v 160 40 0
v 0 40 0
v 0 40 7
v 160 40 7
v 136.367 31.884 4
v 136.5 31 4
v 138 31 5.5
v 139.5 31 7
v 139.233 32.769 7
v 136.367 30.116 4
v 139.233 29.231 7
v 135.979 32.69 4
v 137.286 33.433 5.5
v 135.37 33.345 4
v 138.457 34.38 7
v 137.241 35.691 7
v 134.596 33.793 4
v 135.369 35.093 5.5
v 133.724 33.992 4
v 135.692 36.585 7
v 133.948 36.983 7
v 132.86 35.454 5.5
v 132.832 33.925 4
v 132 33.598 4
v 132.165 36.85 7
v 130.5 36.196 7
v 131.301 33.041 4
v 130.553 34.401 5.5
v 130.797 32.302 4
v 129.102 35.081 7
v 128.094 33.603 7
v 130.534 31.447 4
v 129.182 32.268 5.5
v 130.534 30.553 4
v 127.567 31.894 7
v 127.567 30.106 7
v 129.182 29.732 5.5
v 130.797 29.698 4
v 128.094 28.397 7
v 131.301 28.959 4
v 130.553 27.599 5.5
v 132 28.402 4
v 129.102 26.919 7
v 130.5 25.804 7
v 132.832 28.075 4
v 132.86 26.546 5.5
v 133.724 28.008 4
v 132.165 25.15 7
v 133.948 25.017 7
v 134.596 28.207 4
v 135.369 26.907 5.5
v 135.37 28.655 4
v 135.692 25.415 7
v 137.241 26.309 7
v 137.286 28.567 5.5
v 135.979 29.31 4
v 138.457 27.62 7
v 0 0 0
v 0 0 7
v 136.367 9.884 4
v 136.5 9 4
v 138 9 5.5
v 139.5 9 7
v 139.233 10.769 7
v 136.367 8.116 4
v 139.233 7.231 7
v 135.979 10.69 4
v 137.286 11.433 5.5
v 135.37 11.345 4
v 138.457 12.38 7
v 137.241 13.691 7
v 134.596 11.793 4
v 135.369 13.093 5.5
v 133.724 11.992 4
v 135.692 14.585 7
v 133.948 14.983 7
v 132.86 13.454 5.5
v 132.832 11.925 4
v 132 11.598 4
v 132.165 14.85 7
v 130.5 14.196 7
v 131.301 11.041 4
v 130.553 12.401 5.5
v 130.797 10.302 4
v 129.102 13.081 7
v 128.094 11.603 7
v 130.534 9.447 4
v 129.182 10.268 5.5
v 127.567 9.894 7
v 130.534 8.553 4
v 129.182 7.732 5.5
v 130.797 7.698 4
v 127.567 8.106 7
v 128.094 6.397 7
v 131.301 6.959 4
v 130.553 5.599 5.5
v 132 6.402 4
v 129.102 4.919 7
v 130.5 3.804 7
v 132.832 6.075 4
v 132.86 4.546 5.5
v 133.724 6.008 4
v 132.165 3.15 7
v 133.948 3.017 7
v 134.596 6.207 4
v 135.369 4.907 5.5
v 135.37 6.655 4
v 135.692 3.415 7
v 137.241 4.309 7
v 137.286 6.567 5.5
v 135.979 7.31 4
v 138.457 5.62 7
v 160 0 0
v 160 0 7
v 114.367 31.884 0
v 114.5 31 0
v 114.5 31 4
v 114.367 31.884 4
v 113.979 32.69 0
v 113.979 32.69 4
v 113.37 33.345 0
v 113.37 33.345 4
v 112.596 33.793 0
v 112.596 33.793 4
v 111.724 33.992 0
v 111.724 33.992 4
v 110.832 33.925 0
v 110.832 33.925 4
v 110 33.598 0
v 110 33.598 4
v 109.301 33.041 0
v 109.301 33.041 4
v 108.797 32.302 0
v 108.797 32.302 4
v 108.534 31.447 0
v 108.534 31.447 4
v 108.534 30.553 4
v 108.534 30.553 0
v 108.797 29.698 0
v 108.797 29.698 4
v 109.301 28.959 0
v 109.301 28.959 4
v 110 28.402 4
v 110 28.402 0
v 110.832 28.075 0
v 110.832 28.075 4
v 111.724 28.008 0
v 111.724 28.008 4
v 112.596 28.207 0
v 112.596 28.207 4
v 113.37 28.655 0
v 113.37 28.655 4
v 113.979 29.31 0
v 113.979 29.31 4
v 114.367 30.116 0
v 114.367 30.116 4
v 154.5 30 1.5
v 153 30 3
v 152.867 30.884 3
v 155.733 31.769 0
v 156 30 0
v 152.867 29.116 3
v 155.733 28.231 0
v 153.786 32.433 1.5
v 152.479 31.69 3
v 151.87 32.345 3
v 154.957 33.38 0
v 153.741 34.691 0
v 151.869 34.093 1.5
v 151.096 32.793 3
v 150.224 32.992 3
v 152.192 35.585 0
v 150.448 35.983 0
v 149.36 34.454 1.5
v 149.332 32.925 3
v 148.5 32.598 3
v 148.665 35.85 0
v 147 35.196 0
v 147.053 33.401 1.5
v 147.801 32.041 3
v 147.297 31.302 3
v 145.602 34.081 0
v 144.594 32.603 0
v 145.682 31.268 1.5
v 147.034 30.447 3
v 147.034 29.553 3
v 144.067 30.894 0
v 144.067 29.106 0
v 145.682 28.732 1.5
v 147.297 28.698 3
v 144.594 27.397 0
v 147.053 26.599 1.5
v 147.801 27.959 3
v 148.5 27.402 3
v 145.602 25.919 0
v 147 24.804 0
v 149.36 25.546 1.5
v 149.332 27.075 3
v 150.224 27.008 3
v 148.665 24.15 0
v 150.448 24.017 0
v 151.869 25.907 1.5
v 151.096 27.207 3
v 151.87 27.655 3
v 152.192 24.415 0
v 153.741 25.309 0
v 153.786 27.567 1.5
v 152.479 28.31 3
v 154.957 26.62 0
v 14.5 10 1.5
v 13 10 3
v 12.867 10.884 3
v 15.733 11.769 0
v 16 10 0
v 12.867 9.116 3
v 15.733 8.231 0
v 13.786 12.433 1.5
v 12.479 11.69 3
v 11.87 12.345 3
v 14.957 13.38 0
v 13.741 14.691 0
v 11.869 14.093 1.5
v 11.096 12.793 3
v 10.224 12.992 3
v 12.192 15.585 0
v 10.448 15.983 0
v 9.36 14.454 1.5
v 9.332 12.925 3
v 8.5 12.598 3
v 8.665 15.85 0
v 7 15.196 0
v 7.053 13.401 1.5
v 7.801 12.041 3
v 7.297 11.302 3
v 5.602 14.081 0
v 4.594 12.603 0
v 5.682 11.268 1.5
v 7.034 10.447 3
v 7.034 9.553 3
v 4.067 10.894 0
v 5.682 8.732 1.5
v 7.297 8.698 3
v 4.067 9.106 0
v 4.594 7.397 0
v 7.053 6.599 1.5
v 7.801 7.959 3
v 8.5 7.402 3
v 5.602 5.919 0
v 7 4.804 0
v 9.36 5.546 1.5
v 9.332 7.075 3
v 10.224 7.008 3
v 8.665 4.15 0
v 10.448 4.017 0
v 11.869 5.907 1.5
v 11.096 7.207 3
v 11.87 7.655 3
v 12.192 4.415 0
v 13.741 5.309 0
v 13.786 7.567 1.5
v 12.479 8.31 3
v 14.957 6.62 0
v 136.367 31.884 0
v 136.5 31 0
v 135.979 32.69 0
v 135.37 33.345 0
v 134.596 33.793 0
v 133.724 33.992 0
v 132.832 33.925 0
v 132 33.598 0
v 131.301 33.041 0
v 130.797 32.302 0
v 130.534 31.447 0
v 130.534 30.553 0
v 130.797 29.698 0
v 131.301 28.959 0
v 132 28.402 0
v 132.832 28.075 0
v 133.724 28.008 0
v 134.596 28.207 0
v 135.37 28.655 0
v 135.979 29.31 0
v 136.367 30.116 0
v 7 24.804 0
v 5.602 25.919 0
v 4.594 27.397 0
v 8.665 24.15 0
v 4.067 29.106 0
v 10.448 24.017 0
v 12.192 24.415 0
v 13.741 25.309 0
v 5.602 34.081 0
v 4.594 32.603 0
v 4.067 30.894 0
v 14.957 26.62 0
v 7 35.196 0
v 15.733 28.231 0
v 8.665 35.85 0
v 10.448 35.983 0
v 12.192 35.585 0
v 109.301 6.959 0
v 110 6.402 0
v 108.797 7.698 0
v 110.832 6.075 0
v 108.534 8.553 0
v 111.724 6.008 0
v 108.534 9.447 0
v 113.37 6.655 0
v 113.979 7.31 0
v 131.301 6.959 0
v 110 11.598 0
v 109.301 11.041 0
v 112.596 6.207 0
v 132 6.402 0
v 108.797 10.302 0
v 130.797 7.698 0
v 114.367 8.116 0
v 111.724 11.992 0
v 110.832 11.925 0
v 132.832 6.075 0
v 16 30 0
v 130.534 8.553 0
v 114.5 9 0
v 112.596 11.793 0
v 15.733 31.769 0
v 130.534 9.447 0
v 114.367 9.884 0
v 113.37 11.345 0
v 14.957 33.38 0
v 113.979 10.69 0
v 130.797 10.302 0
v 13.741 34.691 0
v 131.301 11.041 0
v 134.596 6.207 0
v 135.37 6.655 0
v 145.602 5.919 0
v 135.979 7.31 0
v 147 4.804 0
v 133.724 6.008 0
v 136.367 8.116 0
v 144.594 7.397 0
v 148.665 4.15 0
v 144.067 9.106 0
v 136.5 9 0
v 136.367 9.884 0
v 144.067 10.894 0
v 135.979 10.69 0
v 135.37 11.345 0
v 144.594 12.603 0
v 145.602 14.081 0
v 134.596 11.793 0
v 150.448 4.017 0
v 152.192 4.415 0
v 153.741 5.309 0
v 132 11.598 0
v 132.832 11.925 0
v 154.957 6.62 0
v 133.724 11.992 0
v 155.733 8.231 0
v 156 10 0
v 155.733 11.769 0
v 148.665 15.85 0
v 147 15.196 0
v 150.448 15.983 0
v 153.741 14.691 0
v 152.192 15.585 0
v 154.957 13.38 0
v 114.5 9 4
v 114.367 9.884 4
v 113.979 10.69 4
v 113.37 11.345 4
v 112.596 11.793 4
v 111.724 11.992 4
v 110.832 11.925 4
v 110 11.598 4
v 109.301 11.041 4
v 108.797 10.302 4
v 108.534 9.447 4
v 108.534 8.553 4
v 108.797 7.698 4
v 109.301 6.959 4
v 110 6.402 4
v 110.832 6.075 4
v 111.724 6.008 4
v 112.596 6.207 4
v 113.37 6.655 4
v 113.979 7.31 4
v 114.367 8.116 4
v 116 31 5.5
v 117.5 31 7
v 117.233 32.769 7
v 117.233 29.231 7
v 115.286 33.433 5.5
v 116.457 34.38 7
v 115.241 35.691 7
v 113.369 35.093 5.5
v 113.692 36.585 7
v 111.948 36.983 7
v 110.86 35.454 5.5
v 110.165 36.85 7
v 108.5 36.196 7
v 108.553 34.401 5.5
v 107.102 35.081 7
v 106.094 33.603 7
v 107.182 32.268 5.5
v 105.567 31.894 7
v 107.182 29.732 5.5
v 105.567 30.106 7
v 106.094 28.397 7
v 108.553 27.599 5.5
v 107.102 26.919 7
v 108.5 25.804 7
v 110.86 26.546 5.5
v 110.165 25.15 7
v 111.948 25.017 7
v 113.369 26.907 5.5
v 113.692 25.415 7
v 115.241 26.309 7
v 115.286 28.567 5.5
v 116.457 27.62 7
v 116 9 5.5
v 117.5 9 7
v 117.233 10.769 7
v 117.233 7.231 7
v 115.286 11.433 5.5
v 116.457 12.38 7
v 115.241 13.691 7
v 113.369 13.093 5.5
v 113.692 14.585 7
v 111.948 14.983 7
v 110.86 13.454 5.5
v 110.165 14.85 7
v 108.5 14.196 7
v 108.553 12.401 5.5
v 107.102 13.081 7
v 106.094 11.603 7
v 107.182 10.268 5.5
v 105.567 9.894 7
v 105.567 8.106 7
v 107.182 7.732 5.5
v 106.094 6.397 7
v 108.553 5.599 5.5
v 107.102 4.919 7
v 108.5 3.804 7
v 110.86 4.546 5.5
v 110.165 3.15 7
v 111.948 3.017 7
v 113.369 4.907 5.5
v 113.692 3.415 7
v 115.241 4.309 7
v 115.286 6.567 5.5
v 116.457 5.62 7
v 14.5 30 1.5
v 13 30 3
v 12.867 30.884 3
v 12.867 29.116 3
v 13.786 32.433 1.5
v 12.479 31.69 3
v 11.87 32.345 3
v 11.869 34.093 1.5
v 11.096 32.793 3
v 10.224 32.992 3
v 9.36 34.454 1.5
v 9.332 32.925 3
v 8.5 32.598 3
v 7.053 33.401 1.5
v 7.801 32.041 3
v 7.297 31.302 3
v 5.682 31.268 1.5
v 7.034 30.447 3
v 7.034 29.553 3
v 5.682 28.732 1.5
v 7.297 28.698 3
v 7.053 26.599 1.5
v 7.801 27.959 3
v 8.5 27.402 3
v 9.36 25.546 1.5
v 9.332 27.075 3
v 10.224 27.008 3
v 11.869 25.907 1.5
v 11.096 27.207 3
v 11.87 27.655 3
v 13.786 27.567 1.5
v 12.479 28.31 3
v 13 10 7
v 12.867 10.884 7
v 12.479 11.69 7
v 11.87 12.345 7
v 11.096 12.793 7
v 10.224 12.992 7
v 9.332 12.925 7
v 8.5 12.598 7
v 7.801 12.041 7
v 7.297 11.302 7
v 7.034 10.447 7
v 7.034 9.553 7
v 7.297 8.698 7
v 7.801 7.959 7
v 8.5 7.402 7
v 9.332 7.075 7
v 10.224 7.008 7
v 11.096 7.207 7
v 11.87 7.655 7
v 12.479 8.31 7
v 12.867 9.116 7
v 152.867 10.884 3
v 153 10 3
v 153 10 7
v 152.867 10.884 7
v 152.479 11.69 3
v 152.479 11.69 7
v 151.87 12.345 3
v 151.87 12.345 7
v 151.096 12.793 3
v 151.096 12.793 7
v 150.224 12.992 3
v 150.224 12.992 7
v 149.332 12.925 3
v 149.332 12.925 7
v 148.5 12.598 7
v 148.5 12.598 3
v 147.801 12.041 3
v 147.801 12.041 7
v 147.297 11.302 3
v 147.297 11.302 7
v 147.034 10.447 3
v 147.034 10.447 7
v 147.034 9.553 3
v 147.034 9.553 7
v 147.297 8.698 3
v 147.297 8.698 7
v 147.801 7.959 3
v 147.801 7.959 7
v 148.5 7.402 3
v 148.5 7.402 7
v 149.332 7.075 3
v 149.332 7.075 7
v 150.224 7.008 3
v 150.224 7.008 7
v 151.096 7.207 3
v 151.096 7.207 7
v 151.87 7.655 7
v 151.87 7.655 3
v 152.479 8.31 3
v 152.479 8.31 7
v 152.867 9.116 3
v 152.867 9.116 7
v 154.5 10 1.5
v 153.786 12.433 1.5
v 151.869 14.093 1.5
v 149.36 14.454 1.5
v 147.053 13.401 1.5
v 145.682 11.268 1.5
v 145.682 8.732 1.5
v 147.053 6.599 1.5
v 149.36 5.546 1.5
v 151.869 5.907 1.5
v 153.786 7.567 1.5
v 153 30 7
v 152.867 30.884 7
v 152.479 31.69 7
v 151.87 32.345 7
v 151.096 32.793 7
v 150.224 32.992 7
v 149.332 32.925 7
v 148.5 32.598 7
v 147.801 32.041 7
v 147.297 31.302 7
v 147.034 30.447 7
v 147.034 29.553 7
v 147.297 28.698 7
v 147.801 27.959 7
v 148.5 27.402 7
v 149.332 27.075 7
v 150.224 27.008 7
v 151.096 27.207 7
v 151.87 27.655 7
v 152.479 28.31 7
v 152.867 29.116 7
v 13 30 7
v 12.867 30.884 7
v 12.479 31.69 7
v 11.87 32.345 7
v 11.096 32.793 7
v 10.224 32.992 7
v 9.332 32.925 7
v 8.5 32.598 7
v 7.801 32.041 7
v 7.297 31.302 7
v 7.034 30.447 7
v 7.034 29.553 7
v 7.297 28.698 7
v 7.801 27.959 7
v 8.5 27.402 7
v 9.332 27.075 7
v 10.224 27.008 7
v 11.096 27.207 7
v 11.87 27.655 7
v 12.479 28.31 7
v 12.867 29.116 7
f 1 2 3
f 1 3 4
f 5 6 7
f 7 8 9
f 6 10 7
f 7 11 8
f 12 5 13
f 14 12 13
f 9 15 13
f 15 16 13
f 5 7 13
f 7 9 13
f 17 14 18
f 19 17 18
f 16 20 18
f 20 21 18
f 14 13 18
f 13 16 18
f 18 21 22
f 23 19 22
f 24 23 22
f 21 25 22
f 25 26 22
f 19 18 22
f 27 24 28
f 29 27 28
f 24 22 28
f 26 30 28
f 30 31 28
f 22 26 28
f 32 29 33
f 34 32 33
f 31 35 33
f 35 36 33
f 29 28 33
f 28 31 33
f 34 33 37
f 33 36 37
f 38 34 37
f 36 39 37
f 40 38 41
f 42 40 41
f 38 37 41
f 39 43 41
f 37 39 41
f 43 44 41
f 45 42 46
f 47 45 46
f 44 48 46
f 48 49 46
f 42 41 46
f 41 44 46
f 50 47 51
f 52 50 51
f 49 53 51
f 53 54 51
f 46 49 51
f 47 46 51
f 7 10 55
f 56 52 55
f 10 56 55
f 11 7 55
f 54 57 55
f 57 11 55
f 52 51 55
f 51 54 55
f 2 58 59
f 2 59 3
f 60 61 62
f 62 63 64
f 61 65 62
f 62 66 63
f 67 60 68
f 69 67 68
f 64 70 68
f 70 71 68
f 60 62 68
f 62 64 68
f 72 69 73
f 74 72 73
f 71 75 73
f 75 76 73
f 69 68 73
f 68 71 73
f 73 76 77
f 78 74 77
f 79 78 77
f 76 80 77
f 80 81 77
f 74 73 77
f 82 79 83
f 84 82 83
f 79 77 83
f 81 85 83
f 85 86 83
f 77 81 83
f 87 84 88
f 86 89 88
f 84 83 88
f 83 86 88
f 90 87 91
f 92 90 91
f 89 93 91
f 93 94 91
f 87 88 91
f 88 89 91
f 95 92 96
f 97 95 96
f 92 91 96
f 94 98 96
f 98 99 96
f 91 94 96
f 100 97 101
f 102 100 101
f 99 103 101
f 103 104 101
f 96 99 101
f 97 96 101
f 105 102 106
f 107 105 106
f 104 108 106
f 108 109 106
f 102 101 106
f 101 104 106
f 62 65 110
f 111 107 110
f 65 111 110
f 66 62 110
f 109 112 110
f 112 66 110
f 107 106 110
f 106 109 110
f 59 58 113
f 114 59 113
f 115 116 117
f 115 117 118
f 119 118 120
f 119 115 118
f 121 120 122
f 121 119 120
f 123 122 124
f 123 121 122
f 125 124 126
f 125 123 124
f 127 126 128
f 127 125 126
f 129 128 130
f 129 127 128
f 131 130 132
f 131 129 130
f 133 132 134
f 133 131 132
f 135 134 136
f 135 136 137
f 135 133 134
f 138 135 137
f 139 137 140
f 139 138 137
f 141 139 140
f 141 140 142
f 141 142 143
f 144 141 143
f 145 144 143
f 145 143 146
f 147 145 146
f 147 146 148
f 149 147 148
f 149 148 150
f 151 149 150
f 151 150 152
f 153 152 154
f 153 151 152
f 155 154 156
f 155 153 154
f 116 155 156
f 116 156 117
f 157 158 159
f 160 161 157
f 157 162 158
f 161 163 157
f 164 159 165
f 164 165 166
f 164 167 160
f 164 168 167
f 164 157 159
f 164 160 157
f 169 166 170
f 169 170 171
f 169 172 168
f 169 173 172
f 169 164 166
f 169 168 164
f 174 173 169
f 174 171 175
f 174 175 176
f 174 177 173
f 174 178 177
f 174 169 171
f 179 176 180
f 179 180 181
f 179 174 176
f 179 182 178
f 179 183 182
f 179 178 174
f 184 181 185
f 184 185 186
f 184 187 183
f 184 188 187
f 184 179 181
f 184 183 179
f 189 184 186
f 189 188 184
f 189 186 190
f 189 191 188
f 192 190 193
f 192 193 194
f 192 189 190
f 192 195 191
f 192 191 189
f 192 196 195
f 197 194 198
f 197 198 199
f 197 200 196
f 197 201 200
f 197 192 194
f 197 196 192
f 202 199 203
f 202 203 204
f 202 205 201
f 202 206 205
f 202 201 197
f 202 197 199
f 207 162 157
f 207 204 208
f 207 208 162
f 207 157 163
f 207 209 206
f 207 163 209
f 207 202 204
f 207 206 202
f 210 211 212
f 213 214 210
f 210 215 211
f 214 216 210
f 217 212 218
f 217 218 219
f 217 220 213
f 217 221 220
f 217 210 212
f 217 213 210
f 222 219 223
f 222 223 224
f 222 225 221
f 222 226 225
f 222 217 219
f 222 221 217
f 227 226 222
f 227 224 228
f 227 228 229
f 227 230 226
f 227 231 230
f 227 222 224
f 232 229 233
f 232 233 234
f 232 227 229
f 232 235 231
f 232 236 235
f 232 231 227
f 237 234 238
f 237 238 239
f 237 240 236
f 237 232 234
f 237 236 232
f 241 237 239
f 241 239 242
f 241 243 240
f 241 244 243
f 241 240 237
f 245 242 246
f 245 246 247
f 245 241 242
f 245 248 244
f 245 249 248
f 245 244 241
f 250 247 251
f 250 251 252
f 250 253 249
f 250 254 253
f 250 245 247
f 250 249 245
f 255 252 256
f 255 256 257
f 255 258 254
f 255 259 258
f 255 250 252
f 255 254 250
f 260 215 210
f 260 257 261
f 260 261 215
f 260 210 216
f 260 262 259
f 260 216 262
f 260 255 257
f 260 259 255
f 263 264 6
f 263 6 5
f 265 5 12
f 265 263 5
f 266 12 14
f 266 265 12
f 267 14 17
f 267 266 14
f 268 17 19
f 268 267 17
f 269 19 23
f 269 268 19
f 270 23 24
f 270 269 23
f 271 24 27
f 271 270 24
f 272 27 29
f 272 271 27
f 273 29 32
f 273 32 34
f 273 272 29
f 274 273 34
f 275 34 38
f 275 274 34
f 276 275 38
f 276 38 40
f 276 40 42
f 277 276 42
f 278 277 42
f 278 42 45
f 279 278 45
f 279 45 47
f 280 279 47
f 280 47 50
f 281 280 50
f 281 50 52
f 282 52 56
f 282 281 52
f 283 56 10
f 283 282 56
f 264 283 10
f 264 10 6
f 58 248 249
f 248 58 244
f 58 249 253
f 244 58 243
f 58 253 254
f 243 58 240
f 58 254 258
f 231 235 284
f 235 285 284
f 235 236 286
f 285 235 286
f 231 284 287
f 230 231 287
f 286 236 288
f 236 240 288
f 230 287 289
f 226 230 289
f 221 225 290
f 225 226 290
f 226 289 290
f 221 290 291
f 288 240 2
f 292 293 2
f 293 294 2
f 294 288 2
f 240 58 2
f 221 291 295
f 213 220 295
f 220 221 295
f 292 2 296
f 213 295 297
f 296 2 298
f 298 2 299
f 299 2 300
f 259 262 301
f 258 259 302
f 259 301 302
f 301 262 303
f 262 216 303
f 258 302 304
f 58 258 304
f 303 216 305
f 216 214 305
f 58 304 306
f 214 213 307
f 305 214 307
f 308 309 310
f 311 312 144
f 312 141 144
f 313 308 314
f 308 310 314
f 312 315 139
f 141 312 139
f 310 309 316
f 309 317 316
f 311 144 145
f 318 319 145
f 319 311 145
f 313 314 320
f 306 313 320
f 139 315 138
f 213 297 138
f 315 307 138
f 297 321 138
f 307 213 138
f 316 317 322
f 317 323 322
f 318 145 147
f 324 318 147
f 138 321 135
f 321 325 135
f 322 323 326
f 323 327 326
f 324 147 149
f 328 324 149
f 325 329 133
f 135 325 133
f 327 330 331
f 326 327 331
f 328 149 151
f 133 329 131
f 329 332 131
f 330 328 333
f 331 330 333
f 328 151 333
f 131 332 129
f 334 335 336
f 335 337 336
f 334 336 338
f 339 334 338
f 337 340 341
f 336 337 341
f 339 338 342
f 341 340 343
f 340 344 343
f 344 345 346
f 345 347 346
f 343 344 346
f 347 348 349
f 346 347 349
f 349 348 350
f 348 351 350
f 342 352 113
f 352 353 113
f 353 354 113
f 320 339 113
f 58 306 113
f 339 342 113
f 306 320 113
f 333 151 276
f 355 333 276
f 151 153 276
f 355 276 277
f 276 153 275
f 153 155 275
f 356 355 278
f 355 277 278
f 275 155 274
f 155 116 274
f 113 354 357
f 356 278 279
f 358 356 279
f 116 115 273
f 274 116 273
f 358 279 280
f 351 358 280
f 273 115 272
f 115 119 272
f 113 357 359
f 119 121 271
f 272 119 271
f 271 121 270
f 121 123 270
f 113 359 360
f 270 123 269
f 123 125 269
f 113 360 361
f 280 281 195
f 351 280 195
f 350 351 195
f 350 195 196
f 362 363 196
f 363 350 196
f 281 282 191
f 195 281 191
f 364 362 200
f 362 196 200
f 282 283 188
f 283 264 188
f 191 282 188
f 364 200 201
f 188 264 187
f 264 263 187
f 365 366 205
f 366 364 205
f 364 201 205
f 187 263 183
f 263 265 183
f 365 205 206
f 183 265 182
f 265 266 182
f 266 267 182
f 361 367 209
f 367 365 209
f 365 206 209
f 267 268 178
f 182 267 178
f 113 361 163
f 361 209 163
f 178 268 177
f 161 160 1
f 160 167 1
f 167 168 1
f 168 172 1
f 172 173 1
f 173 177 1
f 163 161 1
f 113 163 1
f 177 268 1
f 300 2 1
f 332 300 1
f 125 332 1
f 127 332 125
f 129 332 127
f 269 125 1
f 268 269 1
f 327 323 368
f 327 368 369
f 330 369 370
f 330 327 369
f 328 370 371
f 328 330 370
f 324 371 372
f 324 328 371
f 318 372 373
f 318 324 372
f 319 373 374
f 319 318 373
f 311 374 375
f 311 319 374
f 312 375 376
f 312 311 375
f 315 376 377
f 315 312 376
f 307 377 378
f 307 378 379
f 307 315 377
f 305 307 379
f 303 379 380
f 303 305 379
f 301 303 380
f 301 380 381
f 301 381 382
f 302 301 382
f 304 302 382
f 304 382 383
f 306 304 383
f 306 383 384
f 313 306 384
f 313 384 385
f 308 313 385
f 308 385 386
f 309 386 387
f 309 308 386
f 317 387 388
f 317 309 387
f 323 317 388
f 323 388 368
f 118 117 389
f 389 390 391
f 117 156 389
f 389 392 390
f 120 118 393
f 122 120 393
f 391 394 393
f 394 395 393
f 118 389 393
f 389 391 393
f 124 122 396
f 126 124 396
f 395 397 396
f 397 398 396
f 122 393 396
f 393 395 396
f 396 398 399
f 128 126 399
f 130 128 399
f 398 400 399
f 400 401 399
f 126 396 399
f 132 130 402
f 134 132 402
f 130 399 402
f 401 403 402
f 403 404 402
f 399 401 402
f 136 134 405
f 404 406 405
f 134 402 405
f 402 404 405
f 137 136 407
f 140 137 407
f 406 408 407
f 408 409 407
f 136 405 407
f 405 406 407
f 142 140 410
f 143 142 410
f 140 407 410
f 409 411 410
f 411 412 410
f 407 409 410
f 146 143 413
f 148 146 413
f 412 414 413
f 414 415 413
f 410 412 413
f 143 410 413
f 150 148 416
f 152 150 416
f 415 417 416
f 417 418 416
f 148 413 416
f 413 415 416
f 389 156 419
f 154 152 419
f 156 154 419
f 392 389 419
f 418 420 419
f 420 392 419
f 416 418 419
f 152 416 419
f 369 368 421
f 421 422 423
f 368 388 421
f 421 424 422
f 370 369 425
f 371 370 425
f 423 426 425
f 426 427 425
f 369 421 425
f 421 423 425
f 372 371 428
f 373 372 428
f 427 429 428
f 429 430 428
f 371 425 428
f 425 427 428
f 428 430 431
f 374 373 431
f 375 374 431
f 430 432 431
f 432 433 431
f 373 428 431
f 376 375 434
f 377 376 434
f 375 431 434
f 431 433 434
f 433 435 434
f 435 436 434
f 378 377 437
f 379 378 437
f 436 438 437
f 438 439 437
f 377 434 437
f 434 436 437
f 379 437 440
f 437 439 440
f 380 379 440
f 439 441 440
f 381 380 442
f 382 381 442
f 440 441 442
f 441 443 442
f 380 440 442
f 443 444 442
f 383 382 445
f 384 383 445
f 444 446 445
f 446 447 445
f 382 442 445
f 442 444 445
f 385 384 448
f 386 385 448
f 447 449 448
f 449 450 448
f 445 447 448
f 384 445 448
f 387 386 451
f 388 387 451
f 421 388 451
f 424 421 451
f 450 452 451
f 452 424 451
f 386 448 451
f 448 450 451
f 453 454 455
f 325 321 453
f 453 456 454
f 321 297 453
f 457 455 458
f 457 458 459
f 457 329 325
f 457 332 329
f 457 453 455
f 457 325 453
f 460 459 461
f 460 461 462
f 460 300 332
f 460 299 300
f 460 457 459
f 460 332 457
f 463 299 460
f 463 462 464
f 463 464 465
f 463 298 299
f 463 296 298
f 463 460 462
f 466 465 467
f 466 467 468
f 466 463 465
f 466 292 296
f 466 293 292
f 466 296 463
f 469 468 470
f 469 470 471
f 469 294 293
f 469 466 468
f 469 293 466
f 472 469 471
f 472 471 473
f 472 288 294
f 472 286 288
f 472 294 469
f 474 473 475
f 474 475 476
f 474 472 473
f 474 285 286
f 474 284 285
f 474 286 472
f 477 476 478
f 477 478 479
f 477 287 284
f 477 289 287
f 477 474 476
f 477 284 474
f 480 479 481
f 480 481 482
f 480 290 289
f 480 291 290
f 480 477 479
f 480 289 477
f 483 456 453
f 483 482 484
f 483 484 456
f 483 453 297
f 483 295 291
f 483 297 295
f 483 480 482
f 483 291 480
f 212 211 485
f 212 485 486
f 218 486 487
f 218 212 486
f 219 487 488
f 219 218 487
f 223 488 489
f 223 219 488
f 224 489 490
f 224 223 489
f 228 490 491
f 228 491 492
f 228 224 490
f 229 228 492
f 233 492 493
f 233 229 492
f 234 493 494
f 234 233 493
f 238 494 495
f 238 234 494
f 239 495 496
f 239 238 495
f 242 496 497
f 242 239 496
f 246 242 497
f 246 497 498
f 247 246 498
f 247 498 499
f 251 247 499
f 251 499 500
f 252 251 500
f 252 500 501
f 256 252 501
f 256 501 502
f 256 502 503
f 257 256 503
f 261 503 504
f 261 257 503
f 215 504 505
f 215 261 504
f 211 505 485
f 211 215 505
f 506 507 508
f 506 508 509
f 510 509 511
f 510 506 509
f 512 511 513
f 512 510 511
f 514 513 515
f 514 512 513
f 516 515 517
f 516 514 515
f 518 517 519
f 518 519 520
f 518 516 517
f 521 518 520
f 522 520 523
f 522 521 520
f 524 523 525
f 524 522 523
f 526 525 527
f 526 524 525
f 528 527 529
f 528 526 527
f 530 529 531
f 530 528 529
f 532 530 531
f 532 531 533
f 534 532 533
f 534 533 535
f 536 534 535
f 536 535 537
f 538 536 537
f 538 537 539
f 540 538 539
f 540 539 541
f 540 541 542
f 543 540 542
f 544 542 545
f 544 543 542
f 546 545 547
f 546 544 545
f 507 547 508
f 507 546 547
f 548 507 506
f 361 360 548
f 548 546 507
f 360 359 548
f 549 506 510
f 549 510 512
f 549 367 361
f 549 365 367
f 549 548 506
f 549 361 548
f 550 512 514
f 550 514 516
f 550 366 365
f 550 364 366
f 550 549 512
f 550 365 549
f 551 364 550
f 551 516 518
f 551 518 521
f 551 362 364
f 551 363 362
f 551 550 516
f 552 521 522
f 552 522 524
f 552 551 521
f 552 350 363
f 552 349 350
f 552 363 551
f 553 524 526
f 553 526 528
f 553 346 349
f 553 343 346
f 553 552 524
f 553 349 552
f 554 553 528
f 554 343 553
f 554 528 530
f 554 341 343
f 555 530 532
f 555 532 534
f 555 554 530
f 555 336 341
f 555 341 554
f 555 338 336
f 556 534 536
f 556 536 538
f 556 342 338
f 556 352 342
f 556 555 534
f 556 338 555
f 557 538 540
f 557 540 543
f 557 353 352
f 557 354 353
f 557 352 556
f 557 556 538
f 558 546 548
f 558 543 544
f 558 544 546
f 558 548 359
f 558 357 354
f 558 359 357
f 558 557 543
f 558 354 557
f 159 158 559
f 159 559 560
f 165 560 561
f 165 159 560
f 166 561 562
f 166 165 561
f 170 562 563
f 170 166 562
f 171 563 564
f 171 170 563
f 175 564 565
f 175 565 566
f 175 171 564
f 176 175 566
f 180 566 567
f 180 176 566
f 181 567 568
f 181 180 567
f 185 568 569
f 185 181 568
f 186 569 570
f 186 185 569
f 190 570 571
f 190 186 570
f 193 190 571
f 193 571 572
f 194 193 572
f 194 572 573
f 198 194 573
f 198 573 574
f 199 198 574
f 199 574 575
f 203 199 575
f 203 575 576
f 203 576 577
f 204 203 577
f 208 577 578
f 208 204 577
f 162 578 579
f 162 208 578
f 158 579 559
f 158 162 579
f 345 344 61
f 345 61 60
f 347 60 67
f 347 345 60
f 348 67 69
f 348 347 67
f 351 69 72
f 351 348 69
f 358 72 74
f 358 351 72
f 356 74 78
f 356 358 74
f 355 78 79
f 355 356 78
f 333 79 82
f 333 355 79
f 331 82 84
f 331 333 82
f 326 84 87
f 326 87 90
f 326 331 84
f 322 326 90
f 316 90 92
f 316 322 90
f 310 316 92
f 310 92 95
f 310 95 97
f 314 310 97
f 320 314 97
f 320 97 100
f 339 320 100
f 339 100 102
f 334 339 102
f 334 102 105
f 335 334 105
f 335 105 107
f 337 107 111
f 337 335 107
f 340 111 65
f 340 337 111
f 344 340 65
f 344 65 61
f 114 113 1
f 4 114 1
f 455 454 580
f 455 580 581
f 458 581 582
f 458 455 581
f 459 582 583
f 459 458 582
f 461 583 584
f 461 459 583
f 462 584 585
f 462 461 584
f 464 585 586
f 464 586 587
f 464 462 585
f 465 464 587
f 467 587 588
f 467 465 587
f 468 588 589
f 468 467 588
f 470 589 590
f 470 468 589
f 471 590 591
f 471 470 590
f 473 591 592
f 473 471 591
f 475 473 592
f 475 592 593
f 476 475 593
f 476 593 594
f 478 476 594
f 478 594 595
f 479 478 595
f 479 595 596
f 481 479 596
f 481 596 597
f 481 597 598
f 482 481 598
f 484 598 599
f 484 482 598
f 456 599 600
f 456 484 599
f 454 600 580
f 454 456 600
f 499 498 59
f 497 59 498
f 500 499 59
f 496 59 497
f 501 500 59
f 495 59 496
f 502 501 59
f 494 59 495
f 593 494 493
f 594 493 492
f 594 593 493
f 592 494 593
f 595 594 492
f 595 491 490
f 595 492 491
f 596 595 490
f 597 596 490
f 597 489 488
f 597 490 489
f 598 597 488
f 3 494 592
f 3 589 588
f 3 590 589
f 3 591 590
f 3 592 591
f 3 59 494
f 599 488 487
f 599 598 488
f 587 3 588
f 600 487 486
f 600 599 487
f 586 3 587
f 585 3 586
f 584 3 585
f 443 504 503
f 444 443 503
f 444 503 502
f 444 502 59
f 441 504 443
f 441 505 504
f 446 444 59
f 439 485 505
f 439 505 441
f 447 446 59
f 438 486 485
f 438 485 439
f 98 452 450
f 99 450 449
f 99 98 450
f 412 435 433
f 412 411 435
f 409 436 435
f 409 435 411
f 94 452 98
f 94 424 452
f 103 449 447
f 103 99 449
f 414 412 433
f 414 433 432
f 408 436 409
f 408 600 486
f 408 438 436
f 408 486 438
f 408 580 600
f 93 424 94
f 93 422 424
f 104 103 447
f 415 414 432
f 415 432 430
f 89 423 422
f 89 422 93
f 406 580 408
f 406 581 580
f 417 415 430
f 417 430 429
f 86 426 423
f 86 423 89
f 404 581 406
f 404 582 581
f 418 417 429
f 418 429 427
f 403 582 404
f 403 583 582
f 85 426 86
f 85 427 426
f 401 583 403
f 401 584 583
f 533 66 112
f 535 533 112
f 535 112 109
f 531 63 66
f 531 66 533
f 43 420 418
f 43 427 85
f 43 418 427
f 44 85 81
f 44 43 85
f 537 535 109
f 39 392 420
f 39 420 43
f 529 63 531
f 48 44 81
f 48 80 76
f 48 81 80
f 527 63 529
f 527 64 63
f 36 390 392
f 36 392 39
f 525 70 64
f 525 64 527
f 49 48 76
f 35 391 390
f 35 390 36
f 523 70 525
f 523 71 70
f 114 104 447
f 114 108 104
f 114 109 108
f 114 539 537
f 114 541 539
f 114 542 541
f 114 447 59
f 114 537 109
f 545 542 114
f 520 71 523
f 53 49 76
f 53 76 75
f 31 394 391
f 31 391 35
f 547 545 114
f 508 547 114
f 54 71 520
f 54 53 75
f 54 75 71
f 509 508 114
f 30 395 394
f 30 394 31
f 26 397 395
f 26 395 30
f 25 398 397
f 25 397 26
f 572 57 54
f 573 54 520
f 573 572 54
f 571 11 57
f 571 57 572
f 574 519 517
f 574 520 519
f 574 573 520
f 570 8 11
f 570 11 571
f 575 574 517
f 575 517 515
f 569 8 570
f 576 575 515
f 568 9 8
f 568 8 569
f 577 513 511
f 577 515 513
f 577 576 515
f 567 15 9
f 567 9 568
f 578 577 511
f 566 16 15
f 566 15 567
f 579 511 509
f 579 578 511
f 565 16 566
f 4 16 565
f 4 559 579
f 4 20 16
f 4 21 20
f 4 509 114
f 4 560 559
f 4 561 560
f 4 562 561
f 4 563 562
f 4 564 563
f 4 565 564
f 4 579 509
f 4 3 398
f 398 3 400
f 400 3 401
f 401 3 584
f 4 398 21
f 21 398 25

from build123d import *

# Parameters (mm, degrees)
F0_W     = 160
F0_H     = 40
F0_R     = 3
F1_DEPTH = 7
F2_SIZE  = 3


with BuildPart() as f1:
    # F0 (on Top) → F1 (new body)
    with BuildSketch(Plane.XY):
        with Locations((80, 20)):
            Rectangle(F0_W, F0_H)
        with Locations((10, 10)):
            Circle(F0_R, mode=Mode.SUBTRACT)
        with Locations((111.5, 9)):
            Circle(F0_R, mode=Mode.SUBTRACT)
        with Locations((133.5, 9)):
            Circle(F0_R, mode=Mode.SUBTRACT)
        with Locations((150, 10)):
            Circle(F0_R, mode=Mode.SUBTRACT)
        with Locations((10, 30)):
            Circle(F0_R, mode=Mode.SUBTRACT)
        with Locations((111.5, 31)):
            Circle(F0_R, mode=Mode.SUBTRACT)
        with Locations((133.5, 31)):
            Circle(F0_R, mode=Mode.SUBTRACT)
        with Locations((150, 30)):
            Circle(F0_R, mode=Mode.SUBTRACT)
    extrude(amount=F1_DEPTH)

    # F2
    f2_edges = [f1.edges().sort_by_distance(p)[0] for p in [
        (108.5, 31, 7),
        (130.5, 31, 7),
        (130.5, 9, 7),
        (108.5, 9, 7),
        (147, 10, 0),
        (147, 30, 0),
        (7, 10, 0),
        (7, 30, 0),
    ]]
    chamfer(f2_edges, length=F2_SIZE)


solid = f1.part
